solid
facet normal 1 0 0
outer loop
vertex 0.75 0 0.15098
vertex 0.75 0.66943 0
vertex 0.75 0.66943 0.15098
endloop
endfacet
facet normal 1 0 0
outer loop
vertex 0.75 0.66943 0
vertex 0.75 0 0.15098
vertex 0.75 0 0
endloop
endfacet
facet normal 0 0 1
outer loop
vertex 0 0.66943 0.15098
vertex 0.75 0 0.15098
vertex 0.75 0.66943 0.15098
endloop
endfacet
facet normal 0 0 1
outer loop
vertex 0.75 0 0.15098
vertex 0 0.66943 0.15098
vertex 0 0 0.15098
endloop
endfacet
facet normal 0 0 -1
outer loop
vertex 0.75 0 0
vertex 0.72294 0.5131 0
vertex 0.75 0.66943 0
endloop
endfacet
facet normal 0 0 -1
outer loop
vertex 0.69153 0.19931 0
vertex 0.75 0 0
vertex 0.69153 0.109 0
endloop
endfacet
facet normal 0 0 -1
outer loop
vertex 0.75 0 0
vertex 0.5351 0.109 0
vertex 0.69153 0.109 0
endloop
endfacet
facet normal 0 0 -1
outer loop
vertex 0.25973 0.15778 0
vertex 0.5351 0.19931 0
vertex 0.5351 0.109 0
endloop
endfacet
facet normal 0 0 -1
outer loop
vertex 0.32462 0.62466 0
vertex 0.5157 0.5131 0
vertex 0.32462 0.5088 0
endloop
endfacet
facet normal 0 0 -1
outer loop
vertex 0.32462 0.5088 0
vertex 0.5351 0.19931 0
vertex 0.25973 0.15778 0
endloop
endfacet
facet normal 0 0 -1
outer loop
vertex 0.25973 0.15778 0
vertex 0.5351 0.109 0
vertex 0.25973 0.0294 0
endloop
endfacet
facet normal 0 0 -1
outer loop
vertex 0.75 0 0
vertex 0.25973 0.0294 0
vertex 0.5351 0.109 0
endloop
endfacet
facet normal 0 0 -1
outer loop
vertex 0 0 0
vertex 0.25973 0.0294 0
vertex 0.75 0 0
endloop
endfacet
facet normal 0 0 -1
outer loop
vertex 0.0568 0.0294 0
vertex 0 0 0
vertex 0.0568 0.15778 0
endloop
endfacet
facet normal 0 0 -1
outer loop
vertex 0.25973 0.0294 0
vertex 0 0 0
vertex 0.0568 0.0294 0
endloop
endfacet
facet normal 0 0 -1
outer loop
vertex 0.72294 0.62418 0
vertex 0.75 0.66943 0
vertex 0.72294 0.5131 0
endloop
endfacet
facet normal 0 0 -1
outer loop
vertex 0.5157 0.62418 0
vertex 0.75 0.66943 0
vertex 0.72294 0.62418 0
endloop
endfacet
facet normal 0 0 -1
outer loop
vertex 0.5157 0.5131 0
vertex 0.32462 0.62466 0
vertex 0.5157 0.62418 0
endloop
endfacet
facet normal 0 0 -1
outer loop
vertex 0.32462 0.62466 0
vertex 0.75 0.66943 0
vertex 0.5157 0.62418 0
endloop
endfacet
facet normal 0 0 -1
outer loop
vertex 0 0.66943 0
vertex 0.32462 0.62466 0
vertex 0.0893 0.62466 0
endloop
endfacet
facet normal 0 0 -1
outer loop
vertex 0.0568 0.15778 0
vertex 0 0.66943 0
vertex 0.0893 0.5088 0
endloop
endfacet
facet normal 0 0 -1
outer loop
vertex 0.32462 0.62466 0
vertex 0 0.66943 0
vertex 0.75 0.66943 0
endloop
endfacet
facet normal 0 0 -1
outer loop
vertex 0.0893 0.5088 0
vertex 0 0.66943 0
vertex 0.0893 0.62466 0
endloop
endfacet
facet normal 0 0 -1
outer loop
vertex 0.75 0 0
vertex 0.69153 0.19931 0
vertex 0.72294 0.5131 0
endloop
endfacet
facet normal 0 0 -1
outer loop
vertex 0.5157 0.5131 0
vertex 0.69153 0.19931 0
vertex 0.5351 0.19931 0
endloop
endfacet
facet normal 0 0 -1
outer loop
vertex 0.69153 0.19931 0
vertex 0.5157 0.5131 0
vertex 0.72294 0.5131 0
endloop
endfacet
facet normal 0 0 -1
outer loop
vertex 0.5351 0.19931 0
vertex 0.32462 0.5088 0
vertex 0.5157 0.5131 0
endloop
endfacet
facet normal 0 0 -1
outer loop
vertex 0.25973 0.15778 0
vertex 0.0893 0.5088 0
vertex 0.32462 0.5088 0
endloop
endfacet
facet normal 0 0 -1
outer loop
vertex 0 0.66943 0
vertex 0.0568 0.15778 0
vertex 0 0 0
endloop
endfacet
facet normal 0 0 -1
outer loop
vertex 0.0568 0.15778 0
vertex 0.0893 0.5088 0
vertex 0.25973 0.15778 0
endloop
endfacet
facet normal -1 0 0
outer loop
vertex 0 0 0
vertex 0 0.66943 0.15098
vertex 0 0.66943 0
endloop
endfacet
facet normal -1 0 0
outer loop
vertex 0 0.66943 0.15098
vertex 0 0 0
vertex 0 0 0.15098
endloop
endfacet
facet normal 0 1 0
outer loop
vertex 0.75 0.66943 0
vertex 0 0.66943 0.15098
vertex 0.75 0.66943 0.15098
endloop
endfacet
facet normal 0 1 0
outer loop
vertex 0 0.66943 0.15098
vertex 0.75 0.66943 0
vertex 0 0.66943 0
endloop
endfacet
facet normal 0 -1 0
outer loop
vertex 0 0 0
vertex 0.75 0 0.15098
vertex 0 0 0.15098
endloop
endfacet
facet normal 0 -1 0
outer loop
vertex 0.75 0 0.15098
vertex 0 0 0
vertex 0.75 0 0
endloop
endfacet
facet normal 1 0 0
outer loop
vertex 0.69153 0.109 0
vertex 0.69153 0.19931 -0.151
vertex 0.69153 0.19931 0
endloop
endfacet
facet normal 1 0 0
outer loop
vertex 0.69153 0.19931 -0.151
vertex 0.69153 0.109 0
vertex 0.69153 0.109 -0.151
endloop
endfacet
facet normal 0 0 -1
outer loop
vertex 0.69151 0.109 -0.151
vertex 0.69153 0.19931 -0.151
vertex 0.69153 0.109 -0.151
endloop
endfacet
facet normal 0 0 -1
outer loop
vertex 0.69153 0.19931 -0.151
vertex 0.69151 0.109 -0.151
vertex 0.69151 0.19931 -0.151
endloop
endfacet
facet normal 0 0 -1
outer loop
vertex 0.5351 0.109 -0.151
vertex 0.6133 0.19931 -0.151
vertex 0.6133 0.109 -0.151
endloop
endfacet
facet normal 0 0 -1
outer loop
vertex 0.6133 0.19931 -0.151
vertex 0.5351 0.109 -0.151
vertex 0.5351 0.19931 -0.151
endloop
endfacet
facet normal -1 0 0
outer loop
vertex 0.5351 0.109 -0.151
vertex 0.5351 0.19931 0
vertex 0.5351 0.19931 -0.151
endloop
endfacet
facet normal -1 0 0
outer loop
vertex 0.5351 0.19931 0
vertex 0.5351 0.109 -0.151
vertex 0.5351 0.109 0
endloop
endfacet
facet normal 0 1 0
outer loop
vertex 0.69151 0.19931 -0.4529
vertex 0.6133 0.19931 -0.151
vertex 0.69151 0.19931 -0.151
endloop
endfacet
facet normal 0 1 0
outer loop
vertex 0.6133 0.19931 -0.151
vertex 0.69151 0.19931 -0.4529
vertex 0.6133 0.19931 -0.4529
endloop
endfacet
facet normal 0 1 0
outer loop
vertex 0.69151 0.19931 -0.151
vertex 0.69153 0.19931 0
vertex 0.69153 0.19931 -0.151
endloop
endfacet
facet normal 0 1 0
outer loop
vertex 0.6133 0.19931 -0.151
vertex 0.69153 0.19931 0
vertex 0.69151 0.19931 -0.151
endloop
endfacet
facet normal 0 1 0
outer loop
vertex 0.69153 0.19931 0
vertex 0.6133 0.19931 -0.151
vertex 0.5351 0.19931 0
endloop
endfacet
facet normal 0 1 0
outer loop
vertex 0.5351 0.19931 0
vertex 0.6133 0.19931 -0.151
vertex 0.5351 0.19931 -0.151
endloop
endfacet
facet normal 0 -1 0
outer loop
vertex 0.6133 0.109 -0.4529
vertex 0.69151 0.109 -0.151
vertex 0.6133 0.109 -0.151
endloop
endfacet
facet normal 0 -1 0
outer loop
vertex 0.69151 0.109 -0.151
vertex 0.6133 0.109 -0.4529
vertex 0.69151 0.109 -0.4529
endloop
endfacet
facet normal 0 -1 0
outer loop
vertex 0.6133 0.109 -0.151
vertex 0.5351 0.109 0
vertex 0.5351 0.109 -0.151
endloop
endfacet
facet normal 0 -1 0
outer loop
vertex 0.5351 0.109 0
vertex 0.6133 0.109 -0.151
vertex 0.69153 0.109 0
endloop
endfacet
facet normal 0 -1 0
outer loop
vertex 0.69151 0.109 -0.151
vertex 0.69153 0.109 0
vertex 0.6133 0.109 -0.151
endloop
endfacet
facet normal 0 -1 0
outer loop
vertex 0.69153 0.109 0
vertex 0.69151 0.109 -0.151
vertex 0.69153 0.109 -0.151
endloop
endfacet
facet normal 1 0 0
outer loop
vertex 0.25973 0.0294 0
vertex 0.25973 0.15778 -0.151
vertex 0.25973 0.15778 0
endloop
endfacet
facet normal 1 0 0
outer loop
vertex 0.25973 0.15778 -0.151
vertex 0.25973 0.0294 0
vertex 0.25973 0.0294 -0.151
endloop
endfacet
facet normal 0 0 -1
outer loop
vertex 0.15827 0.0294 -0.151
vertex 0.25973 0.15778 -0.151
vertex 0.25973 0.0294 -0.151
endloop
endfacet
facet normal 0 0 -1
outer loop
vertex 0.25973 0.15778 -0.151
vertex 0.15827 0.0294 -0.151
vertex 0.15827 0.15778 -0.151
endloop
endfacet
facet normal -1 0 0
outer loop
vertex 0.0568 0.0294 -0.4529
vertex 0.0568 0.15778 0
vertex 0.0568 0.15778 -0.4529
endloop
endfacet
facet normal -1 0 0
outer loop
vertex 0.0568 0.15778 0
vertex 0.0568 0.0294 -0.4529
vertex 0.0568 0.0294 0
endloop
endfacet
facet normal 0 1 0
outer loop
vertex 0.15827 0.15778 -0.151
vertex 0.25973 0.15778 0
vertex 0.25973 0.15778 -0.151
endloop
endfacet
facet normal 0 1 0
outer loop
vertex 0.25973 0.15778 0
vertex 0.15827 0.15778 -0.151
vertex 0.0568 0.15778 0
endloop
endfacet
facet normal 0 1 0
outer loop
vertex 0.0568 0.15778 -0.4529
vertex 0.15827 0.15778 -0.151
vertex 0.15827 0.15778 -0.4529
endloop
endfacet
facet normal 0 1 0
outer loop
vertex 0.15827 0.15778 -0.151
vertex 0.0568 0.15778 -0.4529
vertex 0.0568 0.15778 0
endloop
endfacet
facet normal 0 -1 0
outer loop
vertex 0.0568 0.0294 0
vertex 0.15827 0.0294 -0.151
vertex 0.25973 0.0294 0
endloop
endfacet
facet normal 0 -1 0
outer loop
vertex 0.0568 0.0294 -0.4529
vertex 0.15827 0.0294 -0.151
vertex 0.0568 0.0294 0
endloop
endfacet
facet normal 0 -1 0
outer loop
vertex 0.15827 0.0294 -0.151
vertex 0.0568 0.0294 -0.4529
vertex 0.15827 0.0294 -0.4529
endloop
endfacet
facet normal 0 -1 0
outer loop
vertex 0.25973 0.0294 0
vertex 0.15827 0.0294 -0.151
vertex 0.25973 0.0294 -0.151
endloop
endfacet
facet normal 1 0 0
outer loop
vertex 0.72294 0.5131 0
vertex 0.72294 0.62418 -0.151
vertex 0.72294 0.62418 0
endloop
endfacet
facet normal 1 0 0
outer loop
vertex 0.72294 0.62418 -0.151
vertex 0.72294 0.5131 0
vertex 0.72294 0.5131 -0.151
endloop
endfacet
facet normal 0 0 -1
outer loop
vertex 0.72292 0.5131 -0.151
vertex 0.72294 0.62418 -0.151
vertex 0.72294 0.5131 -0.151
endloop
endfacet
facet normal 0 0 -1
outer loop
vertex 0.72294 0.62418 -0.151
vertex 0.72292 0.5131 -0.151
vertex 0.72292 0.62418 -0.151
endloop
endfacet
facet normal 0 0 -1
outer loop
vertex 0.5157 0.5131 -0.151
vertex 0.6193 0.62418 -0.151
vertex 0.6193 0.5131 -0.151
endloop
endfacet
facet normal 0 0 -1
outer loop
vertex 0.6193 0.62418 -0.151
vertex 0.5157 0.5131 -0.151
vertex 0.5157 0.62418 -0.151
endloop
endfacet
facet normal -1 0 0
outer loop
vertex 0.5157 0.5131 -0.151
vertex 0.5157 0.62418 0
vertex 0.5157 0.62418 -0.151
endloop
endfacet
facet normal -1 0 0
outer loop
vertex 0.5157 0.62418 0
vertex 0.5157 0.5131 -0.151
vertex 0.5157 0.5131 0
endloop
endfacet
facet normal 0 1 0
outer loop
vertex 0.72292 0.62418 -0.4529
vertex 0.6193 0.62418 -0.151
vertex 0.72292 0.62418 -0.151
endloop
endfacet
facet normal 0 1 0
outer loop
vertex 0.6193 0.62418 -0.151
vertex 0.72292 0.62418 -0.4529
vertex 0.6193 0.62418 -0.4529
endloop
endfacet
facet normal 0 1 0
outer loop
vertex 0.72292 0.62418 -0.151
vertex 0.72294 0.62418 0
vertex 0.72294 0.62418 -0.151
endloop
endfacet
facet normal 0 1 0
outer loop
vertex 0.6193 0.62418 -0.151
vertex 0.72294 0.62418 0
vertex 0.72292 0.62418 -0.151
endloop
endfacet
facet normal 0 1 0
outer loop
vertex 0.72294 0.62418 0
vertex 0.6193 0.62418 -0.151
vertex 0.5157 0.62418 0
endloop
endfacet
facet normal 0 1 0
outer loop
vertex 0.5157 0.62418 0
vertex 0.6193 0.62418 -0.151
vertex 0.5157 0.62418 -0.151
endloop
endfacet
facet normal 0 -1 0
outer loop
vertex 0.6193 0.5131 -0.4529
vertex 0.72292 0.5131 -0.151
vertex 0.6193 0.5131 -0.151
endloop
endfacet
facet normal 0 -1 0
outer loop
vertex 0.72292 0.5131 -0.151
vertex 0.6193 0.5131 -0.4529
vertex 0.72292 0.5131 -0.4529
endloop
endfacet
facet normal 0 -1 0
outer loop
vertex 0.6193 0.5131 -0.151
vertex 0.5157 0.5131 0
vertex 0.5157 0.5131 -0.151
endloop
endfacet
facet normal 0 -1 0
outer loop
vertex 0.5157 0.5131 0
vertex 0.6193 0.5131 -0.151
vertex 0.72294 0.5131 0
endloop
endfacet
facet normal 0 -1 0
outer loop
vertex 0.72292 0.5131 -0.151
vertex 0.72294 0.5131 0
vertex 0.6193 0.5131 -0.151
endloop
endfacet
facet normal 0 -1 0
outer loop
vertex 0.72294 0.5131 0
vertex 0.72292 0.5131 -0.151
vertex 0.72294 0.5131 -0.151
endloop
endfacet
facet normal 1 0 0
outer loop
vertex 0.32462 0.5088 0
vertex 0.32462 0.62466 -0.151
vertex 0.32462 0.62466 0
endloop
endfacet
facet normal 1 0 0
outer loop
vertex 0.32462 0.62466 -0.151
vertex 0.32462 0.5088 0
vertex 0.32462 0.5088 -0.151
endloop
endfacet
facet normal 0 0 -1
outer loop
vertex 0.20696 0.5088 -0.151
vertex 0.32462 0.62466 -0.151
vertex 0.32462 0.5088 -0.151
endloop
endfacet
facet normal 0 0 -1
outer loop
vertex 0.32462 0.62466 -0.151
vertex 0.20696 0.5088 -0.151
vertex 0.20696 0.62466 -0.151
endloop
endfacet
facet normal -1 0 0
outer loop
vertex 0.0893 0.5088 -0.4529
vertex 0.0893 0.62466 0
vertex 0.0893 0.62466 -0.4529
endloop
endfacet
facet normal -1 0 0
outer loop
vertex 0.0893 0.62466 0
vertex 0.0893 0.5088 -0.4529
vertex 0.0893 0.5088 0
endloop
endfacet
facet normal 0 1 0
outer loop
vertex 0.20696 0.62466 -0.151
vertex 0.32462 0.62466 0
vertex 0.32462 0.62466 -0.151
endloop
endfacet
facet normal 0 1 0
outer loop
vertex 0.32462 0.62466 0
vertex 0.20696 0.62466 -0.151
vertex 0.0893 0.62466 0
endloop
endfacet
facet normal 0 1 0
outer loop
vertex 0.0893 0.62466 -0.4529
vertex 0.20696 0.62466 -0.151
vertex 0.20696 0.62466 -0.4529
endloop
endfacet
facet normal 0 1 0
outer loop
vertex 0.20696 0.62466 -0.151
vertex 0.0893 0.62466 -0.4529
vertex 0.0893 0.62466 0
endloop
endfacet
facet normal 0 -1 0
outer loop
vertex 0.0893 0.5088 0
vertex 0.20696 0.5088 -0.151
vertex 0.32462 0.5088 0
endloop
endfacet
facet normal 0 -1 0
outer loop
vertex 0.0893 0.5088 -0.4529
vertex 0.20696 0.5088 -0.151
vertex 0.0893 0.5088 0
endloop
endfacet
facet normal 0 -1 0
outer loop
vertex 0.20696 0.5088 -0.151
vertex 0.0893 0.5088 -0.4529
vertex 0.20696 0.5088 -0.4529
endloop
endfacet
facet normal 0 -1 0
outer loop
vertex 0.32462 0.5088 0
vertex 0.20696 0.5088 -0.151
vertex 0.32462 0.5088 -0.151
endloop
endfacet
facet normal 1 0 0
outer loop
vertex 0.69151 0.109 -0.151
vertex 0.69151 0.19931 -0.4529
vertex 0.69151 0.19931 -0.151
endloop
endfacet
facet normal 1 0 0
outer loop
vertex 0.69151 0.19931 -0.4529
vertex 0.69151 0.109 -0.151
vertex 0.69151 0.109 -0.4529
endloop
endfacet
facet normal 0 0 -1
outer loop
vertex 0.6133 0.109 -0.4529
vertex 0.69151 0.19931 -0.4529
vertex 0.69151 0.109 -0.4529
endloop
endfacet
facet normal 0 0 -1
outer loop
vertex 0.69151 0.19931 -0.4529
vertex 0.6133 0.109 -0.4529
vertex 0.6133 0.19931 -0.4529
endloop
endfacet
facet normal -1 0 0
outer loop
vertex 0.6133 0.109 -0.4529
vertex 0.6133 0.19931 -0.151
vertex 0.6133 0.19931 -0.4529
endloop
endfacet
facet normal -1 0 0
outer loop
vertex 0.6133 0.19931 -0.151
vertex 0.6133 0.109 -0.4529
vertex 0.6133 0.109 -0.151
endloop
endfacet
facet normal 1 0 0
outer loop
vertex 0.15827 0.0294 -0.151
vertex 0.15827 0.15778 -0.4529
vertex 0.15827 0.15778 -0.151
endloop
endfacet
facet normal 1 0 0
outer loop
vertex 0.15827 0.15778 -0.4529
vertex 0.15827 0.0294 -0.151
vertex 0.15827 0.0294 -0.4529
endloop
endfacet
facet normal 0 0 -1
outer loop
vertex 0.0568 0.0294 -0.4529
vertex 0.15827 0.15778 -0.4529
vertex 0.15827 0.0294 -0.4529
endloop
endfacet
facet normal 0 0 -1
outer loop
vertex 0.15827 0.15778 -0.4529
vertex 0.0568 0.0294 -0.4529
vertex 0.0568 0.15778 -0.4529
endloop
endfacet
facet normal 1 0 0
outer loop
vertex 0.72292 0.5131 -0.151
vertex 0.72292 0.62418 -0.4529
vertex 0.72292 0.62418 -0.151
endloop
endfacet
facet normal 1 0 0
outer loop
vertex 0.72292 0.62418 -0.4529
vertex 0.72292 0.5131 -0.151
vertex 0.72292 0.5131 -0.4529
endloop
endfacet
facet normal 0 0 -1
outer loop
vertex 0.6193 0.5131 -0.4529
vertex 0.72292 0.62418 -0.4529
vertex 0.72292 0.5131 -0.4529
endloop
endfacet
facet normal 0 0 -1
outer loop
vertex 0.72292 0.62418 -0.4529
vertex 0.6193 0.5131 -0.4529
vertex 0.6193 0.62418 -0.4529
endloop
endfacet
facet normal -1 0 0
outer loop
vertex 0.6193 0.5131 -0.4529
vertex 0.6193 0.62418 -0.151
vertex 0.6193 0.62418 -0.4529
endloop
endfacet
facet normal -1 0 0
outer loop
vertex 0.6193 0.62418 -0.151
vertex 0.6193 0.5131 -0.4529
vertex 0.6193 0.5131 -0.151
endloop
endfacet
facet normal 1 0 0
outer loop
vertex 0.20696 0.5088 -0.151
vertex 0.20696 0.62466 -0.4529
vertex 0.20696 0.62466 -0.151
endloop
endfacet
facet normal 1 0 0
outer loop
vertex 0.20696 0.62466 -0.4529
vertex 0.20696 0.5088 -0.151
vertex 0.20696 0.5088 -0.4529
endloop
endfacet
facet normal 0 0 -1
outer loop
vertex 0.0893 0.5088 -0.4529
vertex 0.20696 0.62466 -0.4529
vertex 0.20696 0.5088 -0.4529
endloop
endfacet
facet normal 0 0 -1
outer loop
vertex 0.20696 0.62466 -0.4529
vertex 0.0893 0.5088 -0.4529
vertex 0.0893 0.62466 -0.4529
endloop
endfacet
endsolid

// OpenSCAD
// ==========================================
// Parametric CAD Model
// ==========================================

// Resolution for any potential curved surfaces (not used here, but standard)
$fn = 100;

// Base Dimensions
base_length = 0.75;
base_width  = 0.669426;
base_height = 0.150979;

// Shallow Pads Common Dimensions
shallow_pad_depth = 0.151;
shallow_pad_z_start = 0;

// Shallow Pad 1 (0.156427 by 0.090313)
pad1_length = 0.156427;
pad1_width  = 0.090313;
pad1_left   = 0.5351;
pad1_front  = 0.109;

// Shallow Pad 2 (0.202932 by 0.128382)
pad2_length = 0.202932;
pad2_width  = 0.128382;
pad2_left   = 0.0568;
pad2_front  = 0.0294;

// Shallow Pad 3 (0.207237 by 0.111076)
pad3_length = 0.207237;
pad3_width  = 0.111076;
pad3_left   = 0.5157;
pad3_front  = 0.5131;

// Shallow Pad 4 (0.235324 by 0.115862)
pad4_length = 0.235324;
pad4_width  = 0.115862;
pad4_left   = 0.0893;
pad4_front  = 0.5088;

// Deeper Continuations Common Dimensions
deep_pad_depth   = 0.302;
deep_pad_z_start = -0.1509;

// Continuation 1 (under Pad 1)
cont1_length = 0.078214;
cont1_width  = 0.090313;
cont1_left   = 0.6133;
cont1_front  = 0.109;

// Continuation 2 (under Pad 2)
cont2_length = 0.101466;
cont2_width  = 0.128382;
cont2_left   = 0.0568;
cont2_front  = 0.0294;

// Continuation 3 (under Pad 3)
cont3_length = 0.103619;
cont3_width  = 0.111076;
cont3_left   = 0.6193;
cont3_front  = 0.5131;

// Continuation 4 (under Pad 4)
cont4_length = 0.117662;
cont4_width  = 0.115862;
cont4_left   = 0.0893;
cont4_front  = 0.5088;

// ==========================================
// Helper Modules
// ==========================================

// Module to create an underside rectangular pad
// Extends downwards from z_start by depth
module underside_pad(length, width, depth, offset_left, offset_front, z_start) {
    translate([offset_left, offset_front, z_start - depth]) {
        cube([length, width, depth]);
    }
}

// ==========================================
// Main Model Assembly
// ==========================================

union() {
    // 1. Solid Rectangular Base
    // Positioned such that the underside is at Z=0, left is X=0, front is Y=0
    cube([base_length, base_width, base_height]);

    // 2. Four Shallow Rectangular Pads
    underside_pad(pad1_length, pad1_width, shallow_pad_depth, pad1_left, pad1_front, shallow_pad_z_start);
    underside_pad(pad2_length, pad2_width, shallow_pad_depth, pad2_left, pad2_front, shallow_pad_z_start);
    underside_pad(pad3_length, pad3_width, shallow_pad_depth, pad3_left, pad3_front, shallow_pad_z_start);
    underside_pad(pad4_length, pad4_width, shallow_pad_depth, pad4_left, pad4_front, shallow_pad_z_start);

    // 3. Four Deeper Solid Rectangular Continuations
    // These start 0.1509 below the base underside and overlap with the shallow pads by 0.0001
    // to ensure manifold geometry, reaching a total depth of 0.4529 below the base.
    underside_pad(cont1_length, cont1_width, deep_pad_depth, cont1_left, cont1_front, deep_pad_z_start);
    underside_pad(cont2_length, cont2_width, deep_pad_depth, cont2_left, cont2_front, deep_pad_z_start);
    underside_pad(cont3_length, cont3_width, deep_pad_depth, cont3_left, cont3_front, deep_pad_z_start);
    underside_pad(cont4_length, cont4_width, deep_pad_depth, cont4_left, cont4_front, deep_pad_z_start);
}
